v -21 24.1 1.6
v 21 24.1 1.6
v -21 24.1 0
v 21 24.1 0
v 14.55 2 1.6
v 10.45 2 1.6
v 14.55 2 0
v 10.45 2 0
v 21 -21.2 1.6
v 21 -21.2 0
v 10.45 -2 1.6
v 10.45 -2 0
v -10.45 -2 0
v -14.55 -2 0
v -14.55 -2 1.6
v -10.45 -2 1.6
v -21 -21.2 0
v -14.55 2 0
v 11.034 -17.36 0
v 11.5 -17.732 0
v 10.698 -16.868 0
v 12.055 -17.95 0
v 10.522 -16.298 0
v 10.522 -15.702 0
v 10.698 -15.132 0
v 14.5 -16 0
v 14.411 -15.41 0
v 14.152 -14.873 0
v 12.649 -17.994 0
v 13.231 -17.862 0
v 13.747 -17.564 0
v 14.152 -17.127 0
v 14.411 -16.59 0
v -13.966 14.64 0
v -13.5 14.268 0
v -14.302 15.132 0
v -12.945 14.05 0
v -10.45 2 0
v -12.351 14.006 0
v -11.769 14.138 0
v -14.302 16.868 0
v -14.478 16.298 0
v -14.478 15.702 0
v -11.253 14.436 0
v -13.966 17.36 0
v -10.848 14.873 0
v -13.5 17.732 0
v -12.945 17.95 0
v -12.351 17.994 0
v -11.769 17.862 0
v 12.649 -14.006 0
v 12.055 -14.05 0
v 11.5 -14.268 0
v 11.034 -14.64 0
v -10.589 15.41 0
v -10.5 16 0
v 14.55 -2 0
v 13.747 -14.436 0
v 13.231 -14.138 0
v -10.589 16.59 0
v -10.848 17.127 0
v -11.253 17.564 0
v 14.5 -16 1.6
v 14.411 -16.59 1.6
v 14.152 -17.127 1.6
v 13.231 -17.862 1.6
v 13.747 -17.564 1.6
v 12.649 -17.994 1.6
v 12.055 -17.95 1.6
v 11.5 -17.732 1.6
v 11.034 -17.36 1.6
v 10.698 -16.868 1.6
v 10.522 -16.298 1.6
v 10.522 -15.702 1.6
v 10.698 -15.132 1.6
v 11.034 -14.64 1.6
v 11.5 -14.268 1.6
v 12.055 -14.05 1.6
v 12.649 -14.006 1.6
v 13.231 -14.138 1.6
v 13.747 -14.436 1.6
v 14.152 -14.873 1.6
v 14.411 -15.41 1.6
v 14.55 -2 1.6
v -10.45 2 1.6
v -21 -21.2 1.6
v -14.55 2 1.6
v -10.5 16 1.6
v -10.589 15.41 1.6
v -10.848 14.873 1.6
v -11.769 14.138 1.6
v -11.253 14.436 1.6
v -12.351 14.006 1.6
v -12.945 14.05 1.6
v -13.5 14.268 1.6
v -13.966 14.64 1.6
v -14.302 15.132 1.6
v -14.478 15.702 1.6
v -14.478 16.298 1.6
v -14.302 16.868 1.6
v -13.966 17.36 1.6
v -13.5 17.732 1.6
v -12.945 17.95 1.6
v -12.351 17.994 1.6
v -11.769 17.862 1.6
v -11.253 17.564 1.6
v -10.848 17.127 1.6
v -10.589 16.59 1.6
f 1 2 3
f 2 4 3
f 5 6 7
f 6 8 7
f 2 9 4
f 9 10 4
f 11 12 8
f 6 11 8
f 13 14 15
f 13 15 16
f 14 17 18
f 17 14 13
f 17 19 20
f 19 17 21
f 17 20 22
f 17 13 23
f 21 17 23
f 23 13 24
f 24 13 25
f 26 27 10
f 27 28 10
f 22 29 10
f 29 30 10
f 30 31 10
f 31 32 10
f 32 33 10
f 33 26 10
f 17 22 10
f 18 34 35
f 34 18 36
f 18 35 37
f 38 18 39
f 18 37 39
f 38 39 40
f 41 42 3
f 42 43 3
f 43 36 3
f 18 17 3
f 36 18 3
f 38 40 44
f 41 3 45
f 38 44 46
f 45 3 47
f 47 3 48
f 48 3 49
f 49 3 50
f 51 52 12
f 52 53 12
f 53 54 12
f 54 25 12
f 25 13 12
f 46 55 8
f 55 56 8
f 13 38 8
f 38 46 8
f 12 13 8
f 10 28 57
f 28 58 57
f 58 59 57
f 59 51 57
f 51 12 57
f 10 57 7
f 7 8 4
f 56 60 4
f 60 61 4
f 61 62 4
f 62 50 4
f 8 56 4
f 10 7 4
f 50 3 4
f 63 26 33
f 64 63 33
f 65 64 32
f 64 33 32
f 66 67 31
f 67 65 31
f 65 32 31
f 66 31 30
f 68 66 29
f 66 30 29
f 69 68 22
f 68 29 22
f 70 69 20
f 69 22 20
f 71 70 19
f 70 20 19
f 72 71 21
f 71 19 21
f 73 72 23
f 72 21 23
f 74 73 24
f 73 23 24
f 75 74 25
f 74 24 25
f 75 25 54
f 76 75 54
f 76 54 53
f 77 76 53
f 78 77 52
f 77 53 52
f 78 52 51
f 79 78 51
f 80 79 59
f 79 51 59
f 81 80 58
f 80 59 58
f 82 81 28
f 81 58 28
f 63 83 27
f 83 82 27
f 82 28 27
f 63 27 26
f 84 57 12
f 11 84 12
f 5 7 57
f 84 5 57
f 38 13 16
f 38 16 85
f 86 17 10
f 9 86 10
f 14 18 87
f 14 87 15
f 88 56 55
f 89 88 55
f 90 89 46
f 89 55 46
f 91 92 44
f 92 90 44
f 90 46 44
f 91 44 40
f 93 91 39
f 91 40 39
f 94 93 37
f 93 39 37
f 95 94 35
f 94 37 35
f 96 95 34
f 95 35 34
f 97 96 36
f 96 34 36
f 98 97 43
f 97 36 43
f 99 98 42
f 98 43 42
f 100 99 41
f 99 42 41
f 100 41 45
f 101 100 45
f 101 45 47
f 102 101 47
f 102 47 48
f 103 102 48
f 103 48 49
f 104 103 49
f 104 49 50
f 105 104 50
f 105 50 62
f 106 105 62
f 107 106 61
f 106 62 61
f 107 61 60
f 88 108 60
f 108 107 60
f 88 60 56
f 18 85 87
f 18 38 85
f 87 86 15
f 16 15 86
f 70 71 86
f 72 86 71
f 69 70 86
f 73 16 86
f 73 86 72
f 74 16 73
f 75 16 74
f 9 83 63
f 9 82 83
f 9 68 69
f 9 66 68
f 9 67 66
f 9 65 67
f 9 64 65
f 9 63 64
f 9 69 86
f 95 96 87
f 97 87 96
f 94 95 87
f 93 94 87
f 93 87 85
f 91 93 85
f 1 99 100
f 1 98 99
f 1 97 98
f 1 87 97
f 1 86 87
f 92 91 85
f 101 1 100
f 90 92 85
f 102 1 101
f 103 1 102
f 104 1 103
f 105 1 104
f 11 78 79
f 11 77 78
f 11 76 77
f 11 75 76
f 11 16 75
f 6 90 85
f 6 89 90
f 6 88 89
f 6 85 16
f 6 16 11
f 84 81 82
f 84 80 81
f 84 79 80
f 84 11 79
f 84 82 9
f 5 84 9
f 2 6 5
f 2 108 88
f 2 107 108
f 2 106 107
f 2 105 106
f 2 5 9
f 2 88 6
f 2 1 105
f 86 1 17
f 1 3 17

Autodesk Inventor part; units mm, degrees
ref_plane "YZ Plane" through (0, 0, 0) normal (1, 0, 0) x (0, 1, 0)
ref_plane "XZ Plane" through (0, 0, 0) normal (0, 1, 0) x (-1, 0, 0)
ref_plane "XY Plane" through (0, 0, 0) normal (0, 0, 1) x (1, 0, 0)
sketch "Skizze1" plane through (0, 0, 0) normal (0, 0, 1) x (1, 0, 0)
  line L0 (21, 24.1) -> (-21, 24.1)
  line L1 (-21, 24.1) -> (-21, -21.2)
  line L2 (-21, -21.2) -> (21, -21.2)
  line L3 (21, -21.2) -> (21, 24.1)
  line L4 (10.45, 2) -> (14.55, 2)
  line L5 (14.55, 2) -> (14.55, -2)
  line L6 (14.55, -2) -> (10.45, -2)
  line L7 (10.45, -2) -> (10.45, 2)
  circle A0 centre (12.5, -16) radius 2
  circle A1 centre (-12.5, 16) radius 2
  line L8 (-10.45, 2) -> (-14.55, 2)
  line L9 (-14.55, 2) -> (-14.55, -2)
  line L10 (-14.55, -2) -> (-10.45, -2)
  line L11 (-10.45, -2) -> (-10.45, 2)
  line L12 (12.5, 2) -> (12.5, -2) construction
  line L13 (-12.5, 2) -> (-12.5, -2) construction
  line L14 (14.55, 0) -> (-14.55, 0) construction
  line L15 (0, 0) -> (0, 31.6148) construction
  dimension "d1" = 42
  dimension "d3" = 4
  dimension "d4" = 4
  dimension "d5" = 16
  dimension "d6" = 16
  dimension "d7" = 4
  dimension "d8" = 4.1
  dimension "d9" = 21.2
  dimension "d12" = 25
  dimension "d13" = 24.1
extrude "Extrusion1" add sketch "Skizze1" along normal blind 1.6
properties part number "Platine"
